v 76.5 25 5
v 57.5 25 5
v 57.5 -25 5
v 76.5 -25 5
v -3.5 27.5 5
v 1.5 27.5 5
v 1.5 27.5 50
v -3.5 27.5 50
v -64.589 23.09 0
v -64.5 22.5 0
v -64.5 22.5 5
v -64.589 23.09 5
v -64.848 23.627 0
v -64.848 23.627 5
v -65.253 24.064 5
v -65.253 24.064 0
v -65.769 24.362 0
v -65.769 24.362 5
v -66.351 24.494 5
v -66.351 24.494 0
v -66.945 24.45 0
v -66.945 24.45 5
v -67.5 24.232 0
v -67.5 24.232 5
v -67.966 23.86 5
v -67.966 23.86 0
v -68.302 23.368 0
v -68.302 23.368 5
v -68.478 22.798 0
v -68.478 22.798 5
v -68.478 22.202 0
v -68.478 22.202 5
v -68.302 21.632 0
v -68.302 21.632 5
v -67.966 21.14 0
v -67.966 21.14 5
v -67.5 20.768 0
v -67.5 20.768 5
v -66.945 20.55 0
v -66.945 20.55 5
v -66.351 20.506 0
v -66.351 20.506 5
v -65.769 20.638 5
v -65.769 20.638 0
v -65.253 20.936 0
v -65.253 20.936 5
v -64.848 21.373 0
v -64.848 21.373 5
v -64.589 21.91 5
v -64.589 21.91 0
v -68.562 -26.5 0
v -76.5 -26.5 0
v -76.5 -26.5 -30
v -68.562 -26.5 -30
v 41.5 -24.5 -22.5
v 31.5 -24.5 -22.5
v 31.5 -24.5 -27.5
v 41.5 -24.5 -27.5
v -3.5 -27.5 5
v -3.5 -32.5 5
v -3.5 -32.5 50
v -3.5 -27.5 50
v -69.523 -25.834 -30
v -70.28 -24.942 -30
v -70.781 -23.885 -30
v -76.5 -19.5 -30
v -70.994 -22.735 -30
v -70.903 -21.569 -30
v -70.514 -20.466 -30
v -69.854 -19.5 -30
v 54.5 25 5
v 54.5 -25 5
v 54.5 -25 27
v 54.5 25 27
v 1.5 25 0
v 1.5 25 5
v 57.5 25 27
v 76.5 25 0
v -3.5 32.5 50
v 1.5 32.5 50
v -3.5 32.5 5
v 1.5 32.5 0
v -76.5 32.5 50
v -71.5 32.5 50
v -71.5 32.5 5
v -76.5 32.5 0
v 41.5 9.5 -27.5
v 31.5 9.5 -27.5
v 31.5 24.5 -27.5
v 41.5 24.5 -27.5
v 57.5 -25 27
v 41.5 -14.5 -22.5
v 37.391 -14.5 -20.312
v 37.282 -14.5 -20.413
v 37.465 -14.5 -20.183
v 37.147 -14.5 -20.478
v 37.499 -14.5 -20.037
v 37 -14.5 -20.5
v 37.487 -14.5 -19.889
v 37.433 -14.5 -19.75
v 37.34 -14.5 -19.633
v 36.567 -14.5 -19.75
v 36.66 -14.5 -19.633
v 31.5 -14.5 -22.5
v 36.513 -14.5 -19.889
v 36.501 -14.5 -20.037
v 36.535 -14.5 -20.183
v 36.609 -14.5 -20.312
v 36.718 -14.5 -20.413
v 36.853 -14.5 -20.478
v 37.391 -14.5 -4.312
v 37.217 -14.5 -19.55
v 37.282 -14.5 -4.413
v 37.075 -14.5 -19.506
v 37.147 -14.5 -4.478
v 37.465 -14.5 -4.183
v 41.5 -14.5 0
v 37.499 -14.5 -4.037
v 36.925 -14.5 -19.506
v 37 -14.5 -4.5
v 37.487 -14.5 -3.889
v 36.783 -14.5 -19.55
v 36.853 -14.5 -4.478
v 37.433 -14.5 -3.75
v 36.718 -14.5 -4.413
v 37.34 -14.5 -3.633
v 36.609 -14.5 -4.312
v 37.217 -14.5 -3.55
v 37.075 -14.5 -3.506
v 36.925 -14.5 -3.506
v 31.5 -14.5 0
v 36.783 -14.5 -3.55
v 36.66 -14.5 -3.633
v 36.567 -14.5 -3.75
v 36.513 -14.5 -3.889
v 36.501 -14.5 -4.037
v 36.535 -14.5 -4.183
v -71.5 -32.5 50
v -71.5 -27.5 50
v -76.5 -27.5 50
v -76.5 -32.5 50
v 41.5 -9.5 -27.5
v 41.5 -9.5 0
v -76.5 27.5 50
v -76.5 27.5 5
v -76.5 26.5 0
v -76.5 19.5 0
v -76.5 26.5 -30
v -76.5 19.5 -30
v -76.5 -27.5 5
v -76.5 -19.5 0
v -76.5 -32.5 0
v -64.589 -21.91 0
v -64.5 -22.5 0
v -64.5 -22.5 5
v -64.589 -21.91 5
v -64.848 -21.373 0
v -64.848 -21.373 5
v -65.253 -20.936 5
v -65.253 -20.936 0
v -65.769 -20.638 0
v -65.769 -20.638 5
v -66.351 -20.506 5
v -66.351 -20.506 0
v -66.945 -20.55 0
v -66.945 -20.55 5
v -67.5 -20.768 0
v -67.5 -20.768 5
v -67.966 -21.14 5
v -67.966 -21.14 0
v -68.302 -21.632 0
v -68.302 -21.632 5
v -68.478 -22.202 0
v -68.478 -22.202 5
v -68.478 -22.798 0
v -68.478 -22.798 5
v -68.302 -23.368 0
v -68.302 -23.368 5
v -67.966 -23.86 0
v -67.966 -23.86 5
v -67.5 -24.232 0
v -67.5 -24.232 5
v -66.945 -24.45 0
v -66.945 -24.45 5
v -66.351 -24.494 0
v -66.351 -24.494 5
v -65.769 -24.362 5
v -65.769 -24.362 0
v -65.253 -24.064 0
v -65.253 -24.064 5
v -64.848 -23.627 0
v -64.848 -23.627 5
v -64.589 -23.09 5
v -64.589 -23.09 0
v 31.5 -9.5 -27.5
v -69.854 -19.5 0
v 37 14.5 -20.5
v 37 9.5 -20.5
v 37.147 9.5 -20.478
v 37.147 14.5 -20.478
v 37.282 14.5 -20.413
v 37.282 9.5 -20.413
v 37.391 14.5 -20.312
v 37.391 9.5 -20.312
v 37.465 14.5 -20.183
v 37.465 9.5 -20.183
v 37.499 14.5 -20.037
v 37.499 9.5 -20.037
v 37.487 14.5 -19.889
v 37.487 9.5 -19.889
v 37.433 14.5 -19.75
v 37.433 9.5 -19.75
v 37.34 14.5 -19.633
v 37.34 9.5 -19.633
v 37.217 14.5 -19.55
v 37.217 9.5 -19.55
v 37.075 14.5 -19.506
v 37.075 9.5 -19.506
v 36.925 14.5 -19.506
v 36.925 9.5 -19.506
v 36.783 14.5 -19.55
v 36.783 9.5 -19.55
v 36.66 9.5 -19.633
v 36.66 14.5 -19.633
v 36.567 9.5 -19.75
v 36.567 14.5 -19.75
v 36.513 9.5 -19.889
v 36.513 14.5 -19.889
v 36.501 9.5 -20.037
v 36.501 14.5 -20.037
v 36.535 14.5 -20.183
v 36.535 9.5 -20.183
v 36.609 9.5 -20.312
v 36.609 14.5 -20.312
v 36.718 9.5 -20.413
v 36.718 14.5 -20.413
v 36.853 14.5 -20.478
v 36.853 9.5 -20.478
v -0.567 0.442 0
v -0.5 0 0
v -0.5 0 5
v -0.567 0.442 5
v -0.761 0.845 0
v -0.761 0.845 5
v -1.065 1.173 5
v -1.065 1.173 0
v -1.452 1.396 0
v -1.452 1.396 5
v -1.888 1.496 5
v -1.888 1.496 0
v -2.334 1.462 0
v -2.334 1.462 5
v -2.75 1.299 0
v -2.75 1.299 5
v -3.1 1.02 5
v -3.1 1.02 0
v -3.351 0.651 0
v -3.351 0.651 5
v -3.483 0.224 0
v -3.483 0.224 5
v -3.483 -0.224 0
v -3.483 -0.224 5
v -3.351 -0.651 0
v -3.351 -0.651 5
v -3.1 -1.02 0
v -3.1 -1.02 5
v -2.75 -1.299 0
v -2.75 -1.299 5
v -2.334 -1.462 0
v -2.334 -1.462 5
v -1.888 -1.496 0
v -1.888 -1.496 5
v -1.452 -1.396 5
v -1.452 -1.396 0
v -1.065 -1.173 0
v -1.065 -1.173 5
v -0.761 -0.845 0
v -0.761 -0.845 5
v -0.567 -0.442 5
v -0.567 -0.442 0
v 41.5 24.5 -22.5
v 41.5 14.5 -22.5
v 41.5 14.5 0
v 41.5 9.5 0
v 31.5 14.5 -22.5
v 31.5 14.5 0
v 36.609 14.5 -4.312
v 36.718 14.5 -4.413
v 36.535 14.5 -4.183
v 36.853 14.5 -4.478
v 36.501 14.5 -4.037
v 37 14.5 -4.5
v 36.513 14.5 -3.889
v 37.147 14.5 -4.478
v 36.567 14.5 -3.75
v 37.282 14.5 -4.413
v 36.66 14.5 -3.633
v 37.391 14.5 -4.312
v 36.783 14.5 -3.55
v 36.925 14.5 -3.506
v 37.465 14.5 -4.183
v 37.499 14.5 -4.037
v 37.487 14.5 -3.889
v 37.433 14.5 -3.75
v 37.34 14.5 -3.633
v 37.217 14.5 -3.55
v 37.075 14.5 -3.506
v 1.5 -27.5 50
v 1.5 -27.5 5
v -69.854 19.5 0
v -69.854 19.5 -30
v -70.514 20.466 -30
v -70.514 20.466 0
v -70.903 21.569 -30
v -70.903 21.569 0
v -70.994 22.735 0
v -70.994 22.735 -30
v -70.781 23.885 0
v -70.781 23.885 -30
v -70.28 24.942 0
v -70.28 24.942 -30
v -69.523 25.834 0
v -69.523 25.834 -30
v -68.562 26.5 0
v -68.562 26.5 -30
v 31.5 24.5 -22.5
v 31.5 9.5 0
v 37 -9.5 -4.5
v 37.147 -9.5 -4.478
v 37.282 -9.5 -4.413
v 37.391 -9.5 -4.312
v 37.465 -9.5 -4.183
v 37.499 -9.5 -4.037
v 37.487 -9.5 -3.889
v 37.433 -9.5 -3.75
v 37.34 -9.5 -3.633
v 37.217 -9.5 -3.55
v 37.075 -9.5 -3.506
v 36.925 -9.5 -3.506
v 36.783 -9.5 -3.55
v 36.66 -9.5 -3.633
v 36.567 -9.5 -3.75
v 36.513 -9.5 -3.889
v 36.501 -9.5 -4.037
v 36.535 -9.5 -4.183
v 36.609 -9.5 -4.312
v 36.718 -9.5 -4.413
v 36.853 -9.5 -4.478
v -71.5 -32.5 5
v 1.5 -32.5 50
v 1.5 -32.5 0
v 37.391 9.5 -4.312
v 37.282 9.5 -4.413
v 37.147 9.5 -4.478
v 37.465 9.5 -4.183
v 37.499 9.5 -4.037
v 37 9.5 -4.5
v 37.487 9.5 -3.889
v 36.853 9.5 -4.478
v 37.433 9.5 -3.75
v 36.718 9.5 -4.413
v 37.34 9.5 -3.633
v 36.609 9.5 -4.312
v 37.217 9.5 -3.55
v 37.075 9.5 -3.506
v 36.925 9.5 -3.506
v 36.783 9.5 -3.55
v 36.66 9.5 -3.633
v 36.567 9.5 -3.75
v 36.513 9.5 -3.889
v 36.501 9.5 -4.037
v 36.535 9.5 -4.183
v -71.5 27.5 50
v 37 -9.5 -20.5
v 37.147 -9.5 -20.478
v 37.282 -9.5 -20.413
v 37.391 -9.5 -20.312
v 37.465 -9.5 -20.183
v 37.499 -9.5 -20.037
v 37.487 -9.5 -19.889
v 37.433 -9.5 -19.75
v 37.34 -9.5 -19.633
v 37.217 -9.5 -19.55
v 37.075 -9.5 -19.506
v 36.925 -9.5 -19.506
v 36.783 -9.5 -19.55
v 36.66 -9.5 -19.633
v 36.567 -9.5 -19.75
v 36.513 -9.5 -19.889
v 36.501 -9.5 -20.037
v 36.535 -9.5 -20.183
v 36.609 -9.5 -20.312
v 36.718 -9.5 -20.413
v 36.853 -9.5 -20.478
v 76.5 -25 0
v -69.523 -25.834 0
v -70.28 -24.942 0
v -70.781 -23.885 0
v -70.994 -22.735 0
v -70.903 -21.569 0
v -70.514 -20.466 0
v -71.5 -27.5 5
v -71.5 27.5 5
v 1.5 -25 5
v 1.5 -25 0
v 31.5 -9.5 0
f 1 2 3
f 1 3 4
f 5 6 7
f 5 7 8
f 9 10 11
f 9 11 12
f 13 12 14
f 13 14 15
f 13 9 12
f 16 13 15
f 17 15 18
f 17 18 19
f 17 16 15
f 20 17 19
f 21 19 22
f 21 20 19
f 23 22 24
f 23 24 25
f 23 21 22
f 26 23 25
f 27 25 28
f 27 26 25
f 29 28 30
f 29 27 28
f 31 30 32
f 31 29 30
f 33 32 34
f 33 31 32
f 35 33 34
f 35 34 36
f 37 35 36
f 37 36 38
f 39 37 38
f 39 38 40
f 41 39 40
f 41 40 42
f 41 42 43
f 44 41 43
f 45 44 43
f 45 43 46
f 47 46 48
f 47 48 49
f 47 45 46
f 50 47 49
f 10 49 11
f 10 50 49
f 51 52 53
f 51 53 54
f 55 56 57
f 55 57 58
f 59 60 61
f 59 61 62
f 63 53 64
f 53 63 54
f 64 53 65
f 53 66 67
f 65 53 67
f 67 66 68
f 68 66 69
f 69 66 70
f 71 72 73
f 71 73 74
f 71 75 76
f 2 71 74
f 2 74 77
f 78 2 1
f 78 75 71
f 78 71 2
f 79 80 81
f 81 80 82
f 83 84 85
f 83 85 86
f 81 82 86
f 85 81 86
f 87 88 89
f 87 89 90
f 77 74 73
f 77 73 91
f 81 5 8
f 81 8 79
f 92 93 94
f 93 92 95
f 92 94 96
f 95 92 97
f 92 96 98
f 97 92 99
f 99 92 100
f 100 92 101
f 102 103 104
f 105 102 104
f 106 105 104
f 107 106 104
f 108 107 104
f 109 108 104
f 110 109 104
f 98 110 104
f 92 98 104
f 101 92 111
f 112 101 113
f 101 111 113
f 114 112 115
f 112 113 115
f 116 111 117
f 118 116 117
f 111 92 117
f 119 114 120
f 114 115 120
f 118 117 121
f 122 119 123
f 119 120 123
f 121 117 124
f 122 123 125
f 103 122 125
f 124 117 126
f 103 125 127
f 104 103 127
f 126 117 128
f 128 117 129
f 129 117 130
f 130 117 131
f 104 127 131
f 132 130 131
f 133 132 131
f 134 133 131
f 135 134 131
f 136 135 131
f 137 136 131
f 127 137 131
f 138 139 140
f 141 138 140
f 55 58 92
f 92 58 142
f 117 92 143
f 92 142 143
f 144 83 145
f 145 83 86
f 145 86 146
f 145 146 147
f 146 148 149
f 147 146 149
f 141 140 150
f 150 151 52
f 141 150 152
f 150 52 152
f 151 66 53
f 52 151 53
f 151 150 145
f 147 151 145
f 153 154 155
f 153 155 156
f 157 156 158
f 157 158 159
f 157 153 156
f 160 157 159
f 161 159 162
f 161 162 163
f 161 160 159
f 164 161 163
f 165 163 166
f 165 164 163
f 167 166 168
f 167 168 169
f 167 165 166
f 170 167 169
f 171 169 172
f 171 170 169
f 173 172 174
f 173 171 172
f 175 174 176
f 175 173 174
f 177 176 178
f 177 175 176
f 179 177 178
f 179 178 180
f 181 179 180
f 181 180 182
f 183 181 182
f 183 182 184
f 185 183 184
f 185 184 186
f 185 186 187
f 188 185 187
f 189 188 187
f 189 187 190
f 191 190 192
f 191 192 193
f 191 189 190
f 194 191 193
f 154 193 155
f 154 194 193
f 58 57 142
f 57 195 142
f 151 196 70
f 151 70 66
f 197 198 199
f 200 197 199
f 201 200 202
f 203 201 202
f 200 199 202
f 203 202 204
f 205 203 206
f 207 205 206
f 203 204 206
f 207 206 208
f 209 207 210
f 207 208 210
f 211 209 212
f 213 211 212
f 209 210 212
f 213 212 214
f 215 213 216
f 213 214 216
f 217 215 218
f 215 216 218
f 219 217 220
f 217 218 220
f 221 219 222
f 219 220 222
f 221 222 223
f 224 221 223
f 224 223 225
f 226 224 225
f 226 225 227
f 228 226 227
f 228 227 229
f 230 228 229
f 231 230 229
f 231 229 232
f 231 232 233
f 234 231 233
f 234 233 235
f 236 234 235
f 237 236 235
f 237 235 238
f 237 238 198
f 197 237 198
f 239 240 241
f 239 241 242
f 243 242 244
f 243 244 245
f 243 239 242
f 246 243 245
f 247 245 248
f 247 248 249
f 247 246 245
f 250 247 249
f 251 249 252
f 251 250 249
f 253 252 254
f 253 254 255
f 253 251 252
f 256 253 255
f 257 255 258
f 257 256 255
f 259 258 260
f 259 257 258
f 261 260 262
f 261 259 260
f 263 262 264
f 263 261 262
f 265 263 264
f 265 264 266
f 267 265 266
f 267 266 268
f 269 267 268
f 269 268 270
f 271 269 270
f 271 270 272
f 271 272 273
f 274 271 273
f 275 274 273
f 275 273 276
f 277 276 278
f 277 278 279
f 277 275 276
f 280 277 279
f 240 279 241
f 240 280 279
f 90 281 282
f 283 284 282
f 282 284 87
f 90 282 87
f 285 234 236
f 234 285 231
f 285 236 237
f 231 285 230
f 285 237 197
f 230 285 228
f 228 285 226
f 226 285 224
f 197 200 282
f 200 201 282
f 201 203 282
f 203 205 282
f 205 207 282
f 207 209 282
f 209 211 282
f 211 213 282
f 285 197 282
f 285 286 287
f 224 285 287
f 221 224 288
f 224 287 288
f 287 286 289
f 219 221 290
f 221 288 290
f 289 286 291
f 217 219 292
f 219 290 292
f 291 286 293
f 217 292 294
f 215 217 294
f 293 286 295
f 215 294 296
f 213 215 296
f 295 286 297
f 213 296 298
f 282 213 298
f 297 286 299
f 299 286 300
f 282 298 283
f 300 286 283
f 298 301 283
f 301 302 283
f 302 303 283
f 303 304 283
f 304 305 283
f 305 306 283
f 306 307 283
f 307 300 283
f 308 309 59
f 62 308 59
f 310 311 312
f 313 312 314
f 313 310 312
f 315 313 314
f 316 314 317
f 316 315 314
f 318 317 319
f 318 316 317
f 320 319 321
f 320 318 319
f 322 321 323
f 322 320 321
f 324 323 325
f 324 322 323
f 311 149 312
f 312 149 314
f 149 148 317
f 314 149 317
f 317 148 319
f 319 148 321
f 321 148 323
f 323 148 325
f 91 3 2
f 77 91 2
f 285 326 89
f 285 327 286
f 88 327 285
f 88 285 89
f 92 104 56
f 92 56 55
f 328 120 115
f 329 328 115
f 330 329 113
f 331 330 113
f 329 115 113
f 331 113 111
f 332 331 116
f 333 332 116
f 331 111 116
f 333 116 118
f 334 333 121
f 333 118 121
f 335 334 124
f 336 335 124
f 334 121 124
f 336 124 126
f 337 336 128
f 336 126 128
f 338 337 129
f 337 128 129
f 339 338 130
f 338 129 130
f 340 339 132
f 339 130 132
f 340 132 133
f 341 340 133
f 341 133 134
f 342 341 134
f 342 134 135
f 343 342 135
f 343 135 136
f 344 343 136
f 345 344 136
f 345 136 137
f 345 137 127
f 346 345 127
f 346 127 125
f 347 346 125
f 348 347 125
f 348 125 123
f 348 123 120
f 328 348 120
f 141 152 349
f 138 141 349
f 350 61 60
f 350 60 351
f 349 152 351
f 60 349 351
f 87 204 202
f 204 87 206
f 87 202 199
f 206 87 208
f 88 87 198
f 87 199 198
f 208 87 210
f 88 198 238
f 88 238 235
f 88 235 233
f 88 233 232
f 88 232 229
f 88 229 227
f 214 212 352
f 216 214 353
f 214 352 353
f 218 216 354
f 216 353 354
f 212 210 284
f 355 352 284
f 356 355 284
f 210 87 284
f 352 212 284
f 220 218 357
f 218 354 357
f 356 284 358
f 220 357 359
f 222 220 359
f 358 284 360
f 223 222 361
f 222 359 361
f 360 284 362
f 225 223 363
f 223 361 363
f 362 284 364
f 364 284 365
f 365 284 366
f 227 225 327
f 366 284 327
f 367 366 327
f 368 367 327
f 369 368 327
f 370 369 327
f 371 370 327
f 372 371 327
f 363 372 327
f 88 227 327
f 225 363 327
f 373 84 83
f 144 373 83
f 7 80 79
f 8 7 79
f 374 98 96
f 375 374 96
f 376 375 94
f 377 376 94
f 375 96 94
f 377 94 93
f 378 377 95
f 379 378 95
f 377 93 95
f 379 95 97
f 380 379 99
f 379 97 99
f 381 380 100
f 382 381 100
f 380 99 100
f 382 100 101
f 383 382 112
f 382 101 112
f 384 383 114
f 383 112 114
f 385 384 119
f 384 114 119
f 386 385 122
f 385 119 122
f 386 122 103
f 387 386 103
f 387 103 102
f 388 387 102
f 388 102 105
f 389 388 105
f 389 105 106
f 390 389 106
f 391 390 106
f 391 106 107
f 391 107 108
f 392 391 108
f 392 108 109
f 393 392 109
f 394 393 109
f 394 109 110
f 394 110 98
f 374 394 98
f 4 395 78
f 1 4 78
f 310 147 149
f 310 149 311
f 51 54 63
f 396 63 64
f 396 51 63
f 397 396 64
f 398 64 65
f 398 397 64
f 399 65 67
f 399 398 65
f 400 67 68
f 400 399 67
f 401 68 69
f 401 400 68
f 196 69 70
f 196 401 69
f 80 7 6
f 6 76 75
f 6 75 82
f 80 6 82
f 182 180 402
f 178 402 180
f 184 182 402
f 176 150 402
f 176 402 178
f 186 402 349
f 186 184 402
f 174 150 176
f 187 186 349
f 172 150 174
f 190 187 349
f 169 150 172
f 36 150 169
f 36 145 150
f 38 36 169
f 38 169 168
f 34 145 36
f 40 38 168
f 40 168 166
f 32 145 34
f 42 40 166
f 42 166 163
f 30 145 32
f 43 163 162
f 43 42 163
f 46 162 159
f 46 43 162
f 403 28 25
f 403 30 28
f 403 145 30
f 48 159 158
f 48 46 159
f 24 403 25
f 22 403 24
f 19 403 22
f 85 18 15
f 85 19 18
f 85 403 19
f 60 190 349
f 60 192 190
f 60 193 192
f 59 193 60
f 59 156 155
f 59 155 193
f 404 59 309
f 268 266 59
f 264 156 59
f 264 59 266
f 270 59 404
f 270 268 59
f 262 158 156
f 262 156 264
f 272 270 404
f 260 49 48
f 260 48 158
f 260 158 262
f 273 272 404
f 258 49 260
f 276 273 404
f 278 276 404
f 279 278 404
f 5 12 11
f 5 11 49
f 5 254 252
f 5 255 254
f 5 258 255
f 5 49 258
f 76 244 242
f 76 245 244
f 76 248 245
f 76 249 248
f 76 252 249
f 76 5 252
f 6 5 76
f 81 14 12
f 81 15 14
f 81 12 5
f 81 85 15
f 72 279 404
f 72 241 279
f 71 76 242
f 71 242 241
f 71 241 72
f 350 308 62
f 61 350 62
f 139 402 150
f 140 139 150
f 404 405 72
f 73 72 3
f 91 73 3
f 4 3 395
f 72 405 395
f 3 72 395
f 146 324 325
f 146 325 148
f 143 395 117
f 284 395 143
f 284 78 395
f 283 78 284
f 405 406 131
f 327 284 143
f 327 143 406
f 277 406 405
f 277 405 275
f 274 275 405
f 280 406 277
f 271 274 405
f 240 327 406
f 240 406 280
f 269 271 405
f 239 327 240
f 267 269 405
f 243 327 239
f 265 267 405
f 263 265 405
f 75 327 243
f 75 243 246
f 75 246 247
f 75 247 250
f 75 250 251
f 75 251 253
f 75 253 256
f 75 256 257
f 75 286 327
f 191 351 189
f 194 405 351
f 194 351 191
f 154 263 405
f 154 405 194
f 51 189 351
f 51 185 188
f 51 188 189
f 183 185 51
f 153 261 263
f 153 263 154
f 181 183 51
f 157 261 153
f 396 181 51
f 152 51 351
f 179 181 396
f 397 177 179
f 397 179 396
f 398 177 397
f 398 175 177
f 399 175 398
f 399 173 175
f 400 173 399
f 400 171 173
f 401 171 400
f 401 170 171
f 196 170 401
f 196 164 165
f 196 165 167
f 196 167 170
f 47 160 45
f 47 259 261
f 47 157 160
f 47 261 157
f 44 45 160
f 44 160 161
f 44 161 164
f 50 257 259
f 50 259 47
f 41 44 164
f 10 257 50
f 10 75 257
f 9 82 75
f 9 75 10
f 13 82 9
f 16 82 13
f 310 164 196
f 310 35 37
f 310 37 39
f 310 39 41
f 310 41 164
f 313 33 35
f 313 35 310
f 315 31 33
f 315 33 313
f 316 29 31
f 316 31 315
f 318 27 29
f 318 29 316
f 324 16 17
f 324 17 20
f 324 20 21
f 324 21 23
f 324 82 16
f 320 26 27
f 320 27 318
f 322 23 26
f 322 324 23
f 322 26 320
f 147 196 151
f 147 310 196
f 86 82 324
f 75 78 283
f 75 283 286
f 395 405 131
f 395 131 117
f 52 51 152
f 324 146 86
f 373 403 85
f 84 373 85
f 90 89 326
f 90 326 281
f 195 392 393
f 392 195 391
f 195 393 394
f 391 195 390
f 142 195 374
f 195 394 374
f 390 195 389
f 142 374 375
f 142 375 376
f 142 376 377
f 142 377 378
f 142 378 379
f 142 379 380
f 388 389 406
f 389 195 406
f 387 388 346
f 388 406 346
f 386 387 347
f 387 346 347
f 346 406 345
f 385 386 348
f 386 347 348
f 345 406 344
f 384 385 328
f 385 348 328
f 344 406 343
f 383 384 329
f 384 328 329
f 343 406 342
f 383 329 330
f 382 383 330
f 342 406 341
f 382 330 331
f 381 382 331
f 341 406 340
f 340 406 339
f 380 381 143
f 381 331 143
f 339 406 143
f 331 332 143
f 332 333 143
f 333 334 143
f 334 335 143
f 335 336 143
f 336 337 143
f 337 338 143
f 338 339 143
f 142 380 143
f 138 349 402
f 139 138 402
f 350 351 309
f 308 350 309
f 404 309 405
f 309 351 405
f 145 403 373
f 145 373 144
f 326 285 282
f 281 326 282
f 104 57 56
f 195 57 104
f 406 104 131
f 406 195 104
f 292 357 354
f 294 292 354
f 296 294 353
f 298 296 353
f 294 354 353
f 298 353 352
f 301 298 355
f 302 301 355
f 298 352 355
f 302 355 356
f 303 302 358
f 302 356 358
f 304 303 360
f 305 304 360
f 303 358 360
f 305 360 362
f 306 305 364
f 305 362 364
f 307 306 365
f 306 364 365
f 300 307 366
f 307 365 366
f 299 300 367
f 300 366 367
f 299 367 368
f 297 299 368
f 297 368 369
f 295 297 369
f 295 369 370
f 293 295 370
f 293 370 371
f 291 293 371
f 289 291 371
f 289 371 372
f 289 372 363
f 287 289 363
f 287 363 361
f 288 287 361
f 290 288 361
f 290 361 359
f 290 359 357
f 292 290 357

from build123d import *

# Parameters (mm, degrees)
CROQUIS1_R               = 2
CROQUIS1_R_2             = 1.5
CROQUIS1_W               = 75
CROQUIS1_H               = 50
SALIENTE_EXTRUIR4_DEPTH  = 5
CROQUIS3_W               = 5
CROQUIS3_H               = 5
SALIENTE_EXTRUIR5_DEPTH  = 50
CROQUIS4_W               = 3
CROQUIS4_H               = 50
SALIENTE_EXTRUIR7_DEPTH  = 22
SALIENTE_EXTRUIR9_DEPTH  = 27.5
CROQUIS7_W               = 10
CROQUIS7_H               = 5
SALIENTE_EXTRUIR10_DEPTH = 10
CROQUIS8_W               = 10
CROQUIS8_H               = 5
SALIENTE_EXTRUIR11_DEPTH = 10
SALIENTE_EXTRUIR12_DEPTH = 30
CROQUIS10_R              = 0.5
CORTAR_EXTRUIR2_DEPTH    = 43


with BuildPart() as part:
    # Croquis1 → Saliente-Extruir4 (new body)
    # profile 1 of 2: a face of its own
    with BuildSketch(Plane.XY):
        Polygon((-71.5, -27.5), (-71.5, -32.5), (-3.5, -32.5), (-3.5, -27.5), (1.5, -27.5), (1.5, -25), (1.5, 25), (1.5, 27.5), (-3.5, 27.5), (-3.5, 32.5), (-71.5, 32.5), (-71.5, 27.5), (-76.5, 27.5), (-76.5, -27.5), align=None)
        with Locations((-66.5, -22.5)):
            Circle(CROQUIS1_R, mode=Mode.SUBTRACT)
        with Locations((-2, 0)):
            Circle(CROQUIS1_R_2, mode=Mode.SUBTRACT)
        with Locations((-66.5, 22.5)):
            Circle(CROQUIS1_R, mode=Mode.SUBTRACT)
    # profile 2 of 2: a face of its own
    with BuildSketch(Plane.XY):
        with Locations((39, 0)):
            Rectangle(CROQUIS1_W, CROQUIS1_H)
    extrude(amount=SALIENTE_EXTRUIR4_DEPTH)

    # Croquis3 → Saliente-Extruir5 (add)
    with BuildSketch(Plane(origin=(0, 0, 0), x_dir=(-1, 0, 0), z_dir=(0, 0, -1))):
        with Locations((74, 30)):
            Rectangle(CROQUIS3_W, CROQUIS3_H)
        with Locations((1, -30)):
            Rectangle(CROQUIS3_W, CROQUIS3_H)
        with Locations((1, 30)):
            Rectangle(CROQUIS3_W, CROQUIS3_H)
        with Locations((74, -30)):
            Rectangle(CROQUIS3_W, CROQUIS3_H)
    extrude(amount=-SALIENTE_EXTRUIR5_DEPTH)

    # Croquis4 → Saliente-Extruir7 (add)
    with BuildSketch(Plane.XY.offset(5)):
        with Locations((56, 0)):
            Rectangle(CROQUIS4_W, CROQUIS4_H)
    extrude(amount=SALIENTE_EXTRUIR7_DEPTH)

    # Croquis6 → Saliente-Extruir9 (add)
    with BuildSketch(Plane(origin=(0, 0, 0), x_dir=(-1, 0, 0), z_dir=(0, 0, -1))):
        Polygon((-31.5, 13.5), (-31.5, 14.5), (-41.5, 14.5), (-41.5, 13.5), (-41.5, 9.5), (-31.5, 9.5), align=None)
        Polygon((-31.5, -13.5), (-31.5, -9.5), (-41.5, -9.5), (-41.5, -13.5), (-41.5, -14.5), (-31.5, -14.5), align=None)
    extrude(amount=SALIENTE_EXTRUIR9_DEPTH)

    # Croquis7 → Saliente-Extruir10 (add)
    with BuildSketch(Plane(origin=(0, 14.5, 0), x_dir=(1, 0, 0), z_dir=(0, 1, 0))):
        with Locations((36.5, 25)):
            Rectangle(CROQUIS7_W, CROQUIS7_H)
    extrude(amount=SALIENTE_EXTRUIR10_DEPTH)

    # Croquis8 → Saliente-Extruir11 (add)
    with BuildSketch(Plane.XZ.offset(14.5)):
        with Locations((36.5, -25)):
            Rectangle(CROQUIS8_W, CROQUIS8_H)
    extrude(amount=SALIENTE_EXTRUIR11_DEPTH)

    # Croquis9 → Saliente-Extruir12 (add)
    with BuildSketch(Plane(origin=(0, 0, 0), x_dir=(-1, 0, 0), z_dir=(0, 0, -1))):
        with BuildLine():
            Line((69.854101966, -19.5), (76.5, -19.5))
            Line((76.5, -19.5), (76.5, -26.5))
            Line((76.5, -26.5), (68.561552813, -26.5))
            ThreePointArc((68.561552813, -26.5), (70.925192558, -23.317111271), (69.854101966, -19.5))
        make_face()
        with BuildLine():
            Line((68.561552813, 26.5), (76.5, 26.5))
            Line((76.5, 26.5), (76.5, 19.5))
            Line((76.5, 19.5), (69.854101966, 19.5))
            ThreePointArc((69.854101966, 19.5), (70.925192558, 23.317111271), (68.561552813, 26.5))
        make_face()
    extrude(amount=SALIENTE_EXTRUIR12_DEPTH)

    # Croquis10 → Cortar-Extruir2 (cut)
    with BuildSketch(Plane.XZ.offset(14.5)):
        with Locations(Location((37, -4, 0), (0, 0, 270))):
            Circle(CROQUIS10_R)
        with Locations(Location((37, -20, 0), (0, 0, 270))):
            Circle(CROQUIS10_R)
    extrude(amount=-CORTAR_EXTRUIR2_DEPTH, mode=Mode.SUBTRACT)


solid = part.part
